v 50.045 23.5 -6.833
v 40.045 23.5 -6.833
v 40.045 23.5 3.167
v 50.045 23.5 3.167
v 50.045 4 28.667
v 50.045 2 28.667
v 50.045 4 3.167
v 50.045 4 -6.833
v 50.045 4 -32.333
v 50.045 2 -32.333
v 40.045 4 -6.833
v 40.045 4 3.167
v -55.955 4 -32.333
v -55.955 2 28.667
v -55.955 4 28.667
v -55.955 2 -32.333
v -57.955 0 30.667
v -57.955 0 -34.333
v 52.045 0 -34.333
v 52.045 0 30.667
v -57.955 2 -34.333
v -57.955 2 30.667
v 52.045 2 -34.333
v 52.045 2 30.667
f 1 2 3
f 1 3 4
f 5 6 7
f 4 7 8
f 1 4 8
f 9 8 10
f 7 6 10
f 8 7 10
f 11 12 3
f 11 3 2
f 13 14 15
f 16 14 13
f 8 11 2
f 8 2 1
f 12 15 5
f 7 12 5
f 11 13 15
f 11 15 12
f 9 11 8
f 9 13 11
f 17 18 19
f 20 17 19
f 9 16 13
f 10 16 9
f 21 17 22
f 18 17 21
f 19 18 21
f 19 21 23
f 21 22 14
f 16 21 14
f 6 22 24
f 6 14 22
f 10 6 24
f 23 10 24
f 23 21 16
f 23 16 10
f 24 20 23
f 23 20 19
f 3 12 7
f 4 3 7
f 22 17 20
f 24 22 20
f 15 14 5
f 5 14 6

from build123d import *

# Parameters (mm, degrees)
SKETCH1_W           = 110
SKETCH1_H           = 65
BOSS_EXTRUDE1_DEPTH = 2
SKETCH2_W           = 106
SKETCH2_H           = 61
BOSS_EXTRUDE3_DEPTH = 2
SKETCH6_W           = 10
SKETCH6_H           = 10
BOSS_EXTRUDE4_DEPTH = 19.5


with BuildPart() as part:
    # Sketch1 → Boss-Extrude1 (new body)
    with BuildSketch(Plane(origin=(0, 0, 0), x_dir=(1, 0, 0), z_dir=(0, 1, 0))):
        with Locations((-2.954873439, 1.833455829)):
            Rectangle(SKETCH1_W, SKETCH1_H)
    extrude(amount=BOSS_EXTRUDE1_DEPTH)

    # Sketch2 → Boss-Extrude3 (add)
    with BuildSketch(Plane(origin=(0, 2, 0), x_dir=(1, 0, 0), z_dir=(0, 1, 0))):
        with Locations((-2.954873439, 1.833455829)):
            Rectangle(SKETCH2_W, SKETCH2_H)
    extrude(amount=BOSS_EXTRUDE3_DEPTH)

    # Sketch6 → Boss-Extrude4 (add)
    with BuildSketch(Plane(origin=(0, 4, 0), x_dir=(1, 0, 0), z_dir=(0, 1, 0))):
        with Locations((45.045126561, 1.833455829)):
            Rectangle(SKETCH6_W, SKETCH6_H)
    extrude(amount=BOSS_EXTRUDE4_DEPTH)


solid = part.part
